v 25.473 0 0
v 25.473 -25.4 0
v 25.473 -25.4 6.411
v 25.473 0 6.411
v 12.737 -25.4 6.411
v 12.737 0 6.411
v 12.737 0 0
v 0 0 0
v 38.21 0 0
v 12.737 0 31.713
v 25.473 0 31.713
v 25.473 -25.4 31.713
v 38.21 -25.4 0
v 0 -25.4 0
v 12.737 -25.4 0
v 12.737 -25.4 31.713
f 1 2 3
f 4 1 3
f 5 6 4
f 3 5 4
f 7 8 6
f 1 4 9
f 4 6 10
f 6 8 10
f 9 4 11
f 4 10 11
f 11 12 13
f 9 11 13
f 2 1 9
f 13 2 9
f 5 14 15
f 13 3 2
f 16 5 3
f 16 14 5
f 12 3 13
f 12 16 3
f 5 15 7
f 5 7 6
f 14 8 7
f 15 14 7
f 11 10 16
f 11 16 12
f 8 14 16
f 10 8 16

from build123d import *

# Parameters (mm, degrees)
F0_W     = 38.2099039853
F0_H     = 31.7133665085
F1_DEPTH = 25.4
F3_DEPTH = 25.401
F5_DEPTH = 25.401
F6_W     = 12.736634817
F6_H     = 6.4110578969
F7_DEPTH = 25.401


with BuildPart() as f1:
    # F0 (on Front) → F1 (new body)
    with BuildSketch(Plane.XZ):
        with Locations((19.1049519926, 15.8566832542)):
            Rectangle(F0_W, F0_H)
    extrude(amount=F1_DEPTH)

    # F2 (on face) → F3 (cut, through all)
    with BuildSketch(Plane.XZ.offset(25.4)):
        Polygon((0, 0), (12.7366343513, 31.7133665085), (0, 31.7133665085), align=None)
    extrude(amount=-F3_DEPTH, mode=Mode.SUBTRACT)

    # F4 (on face) → F5 (cut, through all)
    with BuildSketch(Plane.XZ.offset(25.4)):
        Polygon((38.2099039853, 31.7133665085), (25.4732691683, 31.7133665085), (38.2099039853, 0), align=None)
    extrude(amount=-F5_DEPTH, mode=Mode.SUBTRACT)

    # F6 (on face) → F7 (cut, through all)
    with BuildSketch(Plane.XZ.offset(25.4)):
        with Locations((19.1049517598, 3.2055289485)):
            Rectangle(F6_W, F6_H)
    extrude(amount=-F7_DEPTH, mode=Mode.SUBTRACT)


solid = f1.part
